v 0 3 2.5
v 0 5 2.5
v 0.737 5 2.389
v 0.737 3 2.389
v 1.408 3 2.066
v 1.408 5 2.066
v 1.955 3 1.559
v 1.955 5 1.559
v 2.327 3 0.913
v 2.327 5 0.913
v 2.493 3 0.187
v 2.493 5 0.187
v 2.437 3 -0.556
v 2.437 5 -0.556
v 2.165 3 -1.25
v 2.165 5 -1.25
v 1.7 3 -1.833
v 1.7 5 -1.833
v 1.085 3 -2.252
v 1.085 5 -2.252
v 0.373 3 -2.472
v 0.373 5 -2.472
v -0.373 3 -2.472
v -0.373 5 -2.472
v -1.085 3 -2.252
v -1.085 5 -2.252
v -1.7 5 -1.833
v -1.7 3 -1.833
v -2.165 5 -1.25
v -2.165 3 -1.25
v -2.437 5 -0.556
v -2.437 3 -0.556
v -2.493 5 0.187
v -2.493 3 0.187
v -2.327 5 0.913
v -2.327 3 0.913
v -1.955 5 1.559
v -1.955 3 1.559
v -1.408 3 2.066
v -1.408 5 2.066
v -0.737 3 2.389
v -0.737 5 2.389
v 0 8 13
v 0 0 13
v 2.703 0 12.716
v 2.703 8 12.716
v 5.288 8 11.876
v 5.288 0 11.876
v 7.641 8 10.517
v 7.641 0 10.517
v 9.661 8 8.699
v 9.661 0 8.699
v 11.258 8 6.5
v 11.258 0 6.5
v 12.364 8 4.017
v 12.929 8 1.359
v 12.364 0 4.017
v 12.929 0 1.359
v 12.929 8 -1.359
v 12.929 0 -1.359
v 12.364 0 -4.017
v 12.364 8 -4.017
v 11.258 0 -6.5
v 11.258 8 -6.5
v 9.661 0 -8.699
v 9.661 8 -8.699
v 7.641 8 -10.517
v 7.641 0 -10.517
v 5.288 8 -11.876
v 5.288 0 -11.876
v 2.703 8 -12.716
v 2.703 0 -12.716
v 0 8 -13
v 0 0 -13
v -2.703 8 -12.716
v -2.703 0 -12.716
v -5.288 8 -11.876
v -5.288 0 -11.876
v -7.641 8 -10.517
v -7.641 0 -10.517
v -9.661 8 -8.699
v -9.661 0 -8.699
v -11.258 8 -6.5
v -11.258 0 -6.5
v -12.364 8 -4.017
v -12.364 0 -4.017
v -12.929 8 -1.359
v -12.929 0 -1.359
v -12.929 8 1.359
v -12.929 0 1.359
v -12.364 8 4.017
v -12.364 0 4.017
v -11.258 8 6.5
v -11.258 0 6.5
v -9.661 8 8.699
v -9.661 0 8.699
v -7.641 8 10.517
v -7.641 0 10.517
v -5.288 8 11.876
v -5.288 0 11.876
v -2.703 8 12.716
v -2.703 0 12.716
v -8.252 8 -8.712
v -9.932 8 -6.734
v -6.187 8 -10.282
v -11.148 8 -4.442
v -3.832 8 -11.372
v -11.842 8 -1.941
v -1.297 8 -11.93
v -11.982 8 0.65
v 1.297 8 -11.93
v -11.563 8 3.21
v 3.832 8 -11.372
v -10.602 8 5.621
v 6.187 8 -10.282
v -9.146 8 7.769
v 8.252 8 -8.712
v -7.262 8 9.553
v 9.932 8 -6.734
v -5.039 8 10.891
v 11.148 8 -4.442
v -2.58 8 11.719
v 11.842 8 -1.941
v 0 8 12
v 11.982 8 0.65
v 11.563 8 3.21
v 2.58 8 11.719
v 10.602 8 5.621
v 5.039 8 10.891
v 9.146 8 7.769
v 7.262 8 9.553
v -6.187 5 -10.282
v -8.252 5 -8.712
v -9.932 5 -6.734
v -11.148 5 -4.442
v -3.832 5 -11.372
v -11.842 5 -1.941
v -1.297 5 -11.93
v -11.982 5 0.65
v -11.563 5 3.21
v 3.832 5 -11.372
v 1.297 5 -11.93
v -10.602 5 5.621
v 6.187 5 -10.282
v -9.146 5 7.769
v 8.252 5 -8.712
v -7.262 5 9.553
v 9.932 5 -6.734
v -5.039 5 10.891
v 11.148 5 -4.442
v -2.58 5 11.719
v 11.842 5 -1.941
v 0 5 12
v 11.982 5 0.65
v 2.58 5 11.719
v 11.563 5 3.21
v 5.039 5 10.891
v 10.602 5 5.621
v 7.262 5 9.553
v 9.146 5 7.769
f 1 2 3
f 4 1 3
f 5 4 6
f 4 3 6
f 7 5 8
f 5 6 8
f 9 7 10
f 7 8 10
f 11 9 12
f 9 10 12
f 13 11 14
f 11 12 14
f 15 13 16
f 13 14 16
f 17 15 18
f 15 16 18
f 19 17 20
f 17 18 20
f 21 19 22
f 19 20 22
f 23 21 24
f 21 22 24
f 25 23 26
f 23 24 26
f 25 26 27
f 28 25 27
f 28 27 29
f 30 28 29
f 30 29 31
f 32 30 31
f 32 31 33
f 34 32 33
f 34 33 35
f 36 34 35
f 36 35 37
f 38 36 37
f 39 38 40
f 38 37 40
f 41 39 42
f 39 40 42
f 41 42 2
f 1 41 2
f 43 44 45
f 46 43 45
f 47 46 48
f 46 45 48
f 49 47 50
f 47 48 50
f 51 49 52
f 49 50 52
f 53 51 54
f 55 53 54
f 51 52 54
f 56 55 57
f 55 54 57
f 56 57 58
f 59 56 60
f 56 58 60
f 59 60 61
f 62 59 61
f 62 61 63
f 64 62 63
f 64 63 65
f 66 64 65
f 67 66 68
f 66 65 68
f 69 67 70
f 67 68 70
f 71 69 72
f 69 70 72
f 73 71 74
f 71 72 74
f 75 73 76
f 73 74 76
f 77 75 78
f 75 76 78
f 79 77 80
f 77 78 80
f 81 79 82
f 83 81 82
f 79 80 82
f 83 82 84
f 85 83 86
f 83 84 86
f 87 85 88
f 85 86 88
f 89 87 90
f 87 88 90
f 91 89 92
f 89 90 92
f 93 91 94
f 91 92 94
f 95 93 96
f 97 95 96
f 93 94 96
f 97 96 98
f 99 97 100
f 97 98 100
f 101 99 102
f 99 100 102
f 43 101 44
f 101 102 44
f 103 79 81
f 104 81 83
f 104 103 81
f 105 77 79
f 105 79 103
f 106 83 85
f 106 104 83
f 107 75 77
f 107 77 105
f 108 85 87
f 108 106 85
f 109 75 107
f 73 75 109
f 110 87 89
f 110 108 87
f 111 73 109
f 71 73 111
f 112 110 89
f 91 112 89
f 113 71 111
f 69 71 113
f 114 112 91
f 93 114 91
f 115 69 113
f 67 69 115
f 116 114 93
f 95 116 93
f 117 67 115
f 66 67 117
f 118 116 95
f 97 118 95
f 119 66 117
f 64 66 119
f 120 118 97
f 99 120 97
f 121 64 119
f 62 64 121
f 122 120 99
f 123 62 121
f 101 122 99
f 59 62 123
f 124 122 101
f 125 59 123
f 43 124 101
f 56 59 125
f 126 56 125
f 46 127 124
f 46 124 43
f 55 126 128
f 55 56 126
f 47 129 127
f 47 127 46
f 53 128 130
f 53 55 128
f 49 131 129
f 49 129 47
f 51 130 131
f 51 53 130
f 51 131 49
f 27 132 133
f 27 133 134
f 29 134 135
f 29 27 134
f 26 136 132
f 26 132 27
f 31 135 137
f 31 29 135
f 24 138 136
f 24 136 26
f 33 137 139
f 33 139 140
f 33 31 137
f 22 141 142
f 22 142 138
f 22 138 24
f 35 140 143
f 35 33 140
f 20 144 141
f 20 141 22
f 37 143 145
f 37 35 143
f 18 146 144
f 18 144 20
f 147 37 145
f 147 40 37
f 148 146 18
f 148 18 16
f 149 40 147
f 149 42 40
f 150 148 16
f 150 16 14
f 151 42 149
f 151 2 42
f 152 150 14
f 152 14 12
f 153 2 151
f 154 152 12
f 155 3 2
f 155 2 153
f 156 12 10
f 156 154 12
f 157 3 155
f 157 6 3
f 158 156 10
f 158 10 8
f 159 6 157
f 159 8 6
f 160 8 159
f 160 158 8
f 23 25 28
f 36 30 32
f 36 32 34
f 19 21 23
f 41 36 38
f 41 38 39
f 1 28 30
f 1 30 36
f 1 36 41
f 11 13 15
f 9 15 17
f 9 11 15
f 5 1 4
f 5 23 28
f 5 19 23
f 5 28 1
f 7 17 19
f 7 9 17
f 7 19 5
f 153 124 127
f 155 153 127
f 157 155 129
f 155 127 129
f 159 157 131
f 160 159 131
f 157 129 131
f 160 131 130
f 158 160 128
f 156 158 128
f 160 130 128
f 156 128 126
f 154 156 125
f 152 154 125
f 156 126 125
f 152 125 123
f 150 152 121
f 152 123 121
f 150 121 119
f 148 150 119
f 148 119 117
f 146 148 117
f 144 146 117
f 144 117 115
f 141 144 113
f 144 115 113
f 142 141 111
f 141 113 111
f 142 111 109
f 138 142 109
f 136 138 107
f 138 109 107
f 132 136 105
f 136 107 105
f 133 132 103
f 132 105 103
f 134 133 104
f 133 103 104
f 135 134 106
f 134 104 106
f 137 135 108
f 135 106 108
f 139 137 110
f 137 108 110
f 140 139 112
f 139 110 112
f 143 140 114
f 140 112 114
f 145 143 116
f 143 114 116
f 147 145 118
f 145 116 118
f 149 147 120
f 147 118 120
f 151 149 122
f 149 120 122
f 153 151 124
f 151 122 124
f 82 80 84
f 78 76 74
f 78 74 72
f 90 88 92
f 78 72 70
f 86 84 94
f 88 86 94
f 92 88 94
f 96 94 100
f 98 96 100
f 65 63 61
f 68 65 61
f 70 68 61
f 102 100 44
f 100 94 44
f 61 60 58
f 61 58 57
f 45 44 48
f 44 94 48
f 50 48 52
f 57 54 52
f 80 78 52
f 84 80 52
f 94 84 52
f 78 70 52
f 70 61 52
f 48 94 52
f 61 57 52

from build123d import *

# Parameters (mm, degrees)
SKETCH_1_R          = 13
EXTRUDE_1_DEPTH     = 8
SKETCH_2_R          = 12
CUT_EXTRUDE_1_DEPTH = 3
SKETCH_3_R          = 2.5
CUT_EXTRUDE_2_DEPTH = 2


with BuildPart() as part:
    # 草图1 → 凸台-拉伸1 (new body)
    with BuildSketch(Plane(origin=(0, 0, 0), x_dir=(1, 0, 0), z_dir=(0, 1, 0))):
        with Locations(Location((0, 0, 0), (0, 0, 270))):
            Circle(SKETCH_1_R)
    extrude(amount=EXTRUDE_1_DEPTH)

    # 草图2 → 切除-拉伸1 (cut)
    with BuildSketch(Plane(origin=(0, 8, 0), x_dir=(1, 0, 0), z_dir=(0, 1, 0))):
        with Locations(Location((0, 0, 0), (0, 0, 270))):
            Circle(SKETCH_2_R)
    extrude(amount=-CUT_EXTRUDE_1_DEPTH, mode=Mode.SUBTRACT)

    # 草图3 → 切除-拉伸2 (cut)
    with BuildSketch(Plane(origin=(0, 5, 0), x_dir=(1, 0, 0), z_dir=(0, 1, 0))):
        with Locations(Location((0, 0, 0), (0, 0, 270))):
            Circle(SKETCH_3_R)
    extrude(amount=-CUT_EXTRUDE_2_DEPTH, mode=Mode.SUBTRACT)


solid = part.part
